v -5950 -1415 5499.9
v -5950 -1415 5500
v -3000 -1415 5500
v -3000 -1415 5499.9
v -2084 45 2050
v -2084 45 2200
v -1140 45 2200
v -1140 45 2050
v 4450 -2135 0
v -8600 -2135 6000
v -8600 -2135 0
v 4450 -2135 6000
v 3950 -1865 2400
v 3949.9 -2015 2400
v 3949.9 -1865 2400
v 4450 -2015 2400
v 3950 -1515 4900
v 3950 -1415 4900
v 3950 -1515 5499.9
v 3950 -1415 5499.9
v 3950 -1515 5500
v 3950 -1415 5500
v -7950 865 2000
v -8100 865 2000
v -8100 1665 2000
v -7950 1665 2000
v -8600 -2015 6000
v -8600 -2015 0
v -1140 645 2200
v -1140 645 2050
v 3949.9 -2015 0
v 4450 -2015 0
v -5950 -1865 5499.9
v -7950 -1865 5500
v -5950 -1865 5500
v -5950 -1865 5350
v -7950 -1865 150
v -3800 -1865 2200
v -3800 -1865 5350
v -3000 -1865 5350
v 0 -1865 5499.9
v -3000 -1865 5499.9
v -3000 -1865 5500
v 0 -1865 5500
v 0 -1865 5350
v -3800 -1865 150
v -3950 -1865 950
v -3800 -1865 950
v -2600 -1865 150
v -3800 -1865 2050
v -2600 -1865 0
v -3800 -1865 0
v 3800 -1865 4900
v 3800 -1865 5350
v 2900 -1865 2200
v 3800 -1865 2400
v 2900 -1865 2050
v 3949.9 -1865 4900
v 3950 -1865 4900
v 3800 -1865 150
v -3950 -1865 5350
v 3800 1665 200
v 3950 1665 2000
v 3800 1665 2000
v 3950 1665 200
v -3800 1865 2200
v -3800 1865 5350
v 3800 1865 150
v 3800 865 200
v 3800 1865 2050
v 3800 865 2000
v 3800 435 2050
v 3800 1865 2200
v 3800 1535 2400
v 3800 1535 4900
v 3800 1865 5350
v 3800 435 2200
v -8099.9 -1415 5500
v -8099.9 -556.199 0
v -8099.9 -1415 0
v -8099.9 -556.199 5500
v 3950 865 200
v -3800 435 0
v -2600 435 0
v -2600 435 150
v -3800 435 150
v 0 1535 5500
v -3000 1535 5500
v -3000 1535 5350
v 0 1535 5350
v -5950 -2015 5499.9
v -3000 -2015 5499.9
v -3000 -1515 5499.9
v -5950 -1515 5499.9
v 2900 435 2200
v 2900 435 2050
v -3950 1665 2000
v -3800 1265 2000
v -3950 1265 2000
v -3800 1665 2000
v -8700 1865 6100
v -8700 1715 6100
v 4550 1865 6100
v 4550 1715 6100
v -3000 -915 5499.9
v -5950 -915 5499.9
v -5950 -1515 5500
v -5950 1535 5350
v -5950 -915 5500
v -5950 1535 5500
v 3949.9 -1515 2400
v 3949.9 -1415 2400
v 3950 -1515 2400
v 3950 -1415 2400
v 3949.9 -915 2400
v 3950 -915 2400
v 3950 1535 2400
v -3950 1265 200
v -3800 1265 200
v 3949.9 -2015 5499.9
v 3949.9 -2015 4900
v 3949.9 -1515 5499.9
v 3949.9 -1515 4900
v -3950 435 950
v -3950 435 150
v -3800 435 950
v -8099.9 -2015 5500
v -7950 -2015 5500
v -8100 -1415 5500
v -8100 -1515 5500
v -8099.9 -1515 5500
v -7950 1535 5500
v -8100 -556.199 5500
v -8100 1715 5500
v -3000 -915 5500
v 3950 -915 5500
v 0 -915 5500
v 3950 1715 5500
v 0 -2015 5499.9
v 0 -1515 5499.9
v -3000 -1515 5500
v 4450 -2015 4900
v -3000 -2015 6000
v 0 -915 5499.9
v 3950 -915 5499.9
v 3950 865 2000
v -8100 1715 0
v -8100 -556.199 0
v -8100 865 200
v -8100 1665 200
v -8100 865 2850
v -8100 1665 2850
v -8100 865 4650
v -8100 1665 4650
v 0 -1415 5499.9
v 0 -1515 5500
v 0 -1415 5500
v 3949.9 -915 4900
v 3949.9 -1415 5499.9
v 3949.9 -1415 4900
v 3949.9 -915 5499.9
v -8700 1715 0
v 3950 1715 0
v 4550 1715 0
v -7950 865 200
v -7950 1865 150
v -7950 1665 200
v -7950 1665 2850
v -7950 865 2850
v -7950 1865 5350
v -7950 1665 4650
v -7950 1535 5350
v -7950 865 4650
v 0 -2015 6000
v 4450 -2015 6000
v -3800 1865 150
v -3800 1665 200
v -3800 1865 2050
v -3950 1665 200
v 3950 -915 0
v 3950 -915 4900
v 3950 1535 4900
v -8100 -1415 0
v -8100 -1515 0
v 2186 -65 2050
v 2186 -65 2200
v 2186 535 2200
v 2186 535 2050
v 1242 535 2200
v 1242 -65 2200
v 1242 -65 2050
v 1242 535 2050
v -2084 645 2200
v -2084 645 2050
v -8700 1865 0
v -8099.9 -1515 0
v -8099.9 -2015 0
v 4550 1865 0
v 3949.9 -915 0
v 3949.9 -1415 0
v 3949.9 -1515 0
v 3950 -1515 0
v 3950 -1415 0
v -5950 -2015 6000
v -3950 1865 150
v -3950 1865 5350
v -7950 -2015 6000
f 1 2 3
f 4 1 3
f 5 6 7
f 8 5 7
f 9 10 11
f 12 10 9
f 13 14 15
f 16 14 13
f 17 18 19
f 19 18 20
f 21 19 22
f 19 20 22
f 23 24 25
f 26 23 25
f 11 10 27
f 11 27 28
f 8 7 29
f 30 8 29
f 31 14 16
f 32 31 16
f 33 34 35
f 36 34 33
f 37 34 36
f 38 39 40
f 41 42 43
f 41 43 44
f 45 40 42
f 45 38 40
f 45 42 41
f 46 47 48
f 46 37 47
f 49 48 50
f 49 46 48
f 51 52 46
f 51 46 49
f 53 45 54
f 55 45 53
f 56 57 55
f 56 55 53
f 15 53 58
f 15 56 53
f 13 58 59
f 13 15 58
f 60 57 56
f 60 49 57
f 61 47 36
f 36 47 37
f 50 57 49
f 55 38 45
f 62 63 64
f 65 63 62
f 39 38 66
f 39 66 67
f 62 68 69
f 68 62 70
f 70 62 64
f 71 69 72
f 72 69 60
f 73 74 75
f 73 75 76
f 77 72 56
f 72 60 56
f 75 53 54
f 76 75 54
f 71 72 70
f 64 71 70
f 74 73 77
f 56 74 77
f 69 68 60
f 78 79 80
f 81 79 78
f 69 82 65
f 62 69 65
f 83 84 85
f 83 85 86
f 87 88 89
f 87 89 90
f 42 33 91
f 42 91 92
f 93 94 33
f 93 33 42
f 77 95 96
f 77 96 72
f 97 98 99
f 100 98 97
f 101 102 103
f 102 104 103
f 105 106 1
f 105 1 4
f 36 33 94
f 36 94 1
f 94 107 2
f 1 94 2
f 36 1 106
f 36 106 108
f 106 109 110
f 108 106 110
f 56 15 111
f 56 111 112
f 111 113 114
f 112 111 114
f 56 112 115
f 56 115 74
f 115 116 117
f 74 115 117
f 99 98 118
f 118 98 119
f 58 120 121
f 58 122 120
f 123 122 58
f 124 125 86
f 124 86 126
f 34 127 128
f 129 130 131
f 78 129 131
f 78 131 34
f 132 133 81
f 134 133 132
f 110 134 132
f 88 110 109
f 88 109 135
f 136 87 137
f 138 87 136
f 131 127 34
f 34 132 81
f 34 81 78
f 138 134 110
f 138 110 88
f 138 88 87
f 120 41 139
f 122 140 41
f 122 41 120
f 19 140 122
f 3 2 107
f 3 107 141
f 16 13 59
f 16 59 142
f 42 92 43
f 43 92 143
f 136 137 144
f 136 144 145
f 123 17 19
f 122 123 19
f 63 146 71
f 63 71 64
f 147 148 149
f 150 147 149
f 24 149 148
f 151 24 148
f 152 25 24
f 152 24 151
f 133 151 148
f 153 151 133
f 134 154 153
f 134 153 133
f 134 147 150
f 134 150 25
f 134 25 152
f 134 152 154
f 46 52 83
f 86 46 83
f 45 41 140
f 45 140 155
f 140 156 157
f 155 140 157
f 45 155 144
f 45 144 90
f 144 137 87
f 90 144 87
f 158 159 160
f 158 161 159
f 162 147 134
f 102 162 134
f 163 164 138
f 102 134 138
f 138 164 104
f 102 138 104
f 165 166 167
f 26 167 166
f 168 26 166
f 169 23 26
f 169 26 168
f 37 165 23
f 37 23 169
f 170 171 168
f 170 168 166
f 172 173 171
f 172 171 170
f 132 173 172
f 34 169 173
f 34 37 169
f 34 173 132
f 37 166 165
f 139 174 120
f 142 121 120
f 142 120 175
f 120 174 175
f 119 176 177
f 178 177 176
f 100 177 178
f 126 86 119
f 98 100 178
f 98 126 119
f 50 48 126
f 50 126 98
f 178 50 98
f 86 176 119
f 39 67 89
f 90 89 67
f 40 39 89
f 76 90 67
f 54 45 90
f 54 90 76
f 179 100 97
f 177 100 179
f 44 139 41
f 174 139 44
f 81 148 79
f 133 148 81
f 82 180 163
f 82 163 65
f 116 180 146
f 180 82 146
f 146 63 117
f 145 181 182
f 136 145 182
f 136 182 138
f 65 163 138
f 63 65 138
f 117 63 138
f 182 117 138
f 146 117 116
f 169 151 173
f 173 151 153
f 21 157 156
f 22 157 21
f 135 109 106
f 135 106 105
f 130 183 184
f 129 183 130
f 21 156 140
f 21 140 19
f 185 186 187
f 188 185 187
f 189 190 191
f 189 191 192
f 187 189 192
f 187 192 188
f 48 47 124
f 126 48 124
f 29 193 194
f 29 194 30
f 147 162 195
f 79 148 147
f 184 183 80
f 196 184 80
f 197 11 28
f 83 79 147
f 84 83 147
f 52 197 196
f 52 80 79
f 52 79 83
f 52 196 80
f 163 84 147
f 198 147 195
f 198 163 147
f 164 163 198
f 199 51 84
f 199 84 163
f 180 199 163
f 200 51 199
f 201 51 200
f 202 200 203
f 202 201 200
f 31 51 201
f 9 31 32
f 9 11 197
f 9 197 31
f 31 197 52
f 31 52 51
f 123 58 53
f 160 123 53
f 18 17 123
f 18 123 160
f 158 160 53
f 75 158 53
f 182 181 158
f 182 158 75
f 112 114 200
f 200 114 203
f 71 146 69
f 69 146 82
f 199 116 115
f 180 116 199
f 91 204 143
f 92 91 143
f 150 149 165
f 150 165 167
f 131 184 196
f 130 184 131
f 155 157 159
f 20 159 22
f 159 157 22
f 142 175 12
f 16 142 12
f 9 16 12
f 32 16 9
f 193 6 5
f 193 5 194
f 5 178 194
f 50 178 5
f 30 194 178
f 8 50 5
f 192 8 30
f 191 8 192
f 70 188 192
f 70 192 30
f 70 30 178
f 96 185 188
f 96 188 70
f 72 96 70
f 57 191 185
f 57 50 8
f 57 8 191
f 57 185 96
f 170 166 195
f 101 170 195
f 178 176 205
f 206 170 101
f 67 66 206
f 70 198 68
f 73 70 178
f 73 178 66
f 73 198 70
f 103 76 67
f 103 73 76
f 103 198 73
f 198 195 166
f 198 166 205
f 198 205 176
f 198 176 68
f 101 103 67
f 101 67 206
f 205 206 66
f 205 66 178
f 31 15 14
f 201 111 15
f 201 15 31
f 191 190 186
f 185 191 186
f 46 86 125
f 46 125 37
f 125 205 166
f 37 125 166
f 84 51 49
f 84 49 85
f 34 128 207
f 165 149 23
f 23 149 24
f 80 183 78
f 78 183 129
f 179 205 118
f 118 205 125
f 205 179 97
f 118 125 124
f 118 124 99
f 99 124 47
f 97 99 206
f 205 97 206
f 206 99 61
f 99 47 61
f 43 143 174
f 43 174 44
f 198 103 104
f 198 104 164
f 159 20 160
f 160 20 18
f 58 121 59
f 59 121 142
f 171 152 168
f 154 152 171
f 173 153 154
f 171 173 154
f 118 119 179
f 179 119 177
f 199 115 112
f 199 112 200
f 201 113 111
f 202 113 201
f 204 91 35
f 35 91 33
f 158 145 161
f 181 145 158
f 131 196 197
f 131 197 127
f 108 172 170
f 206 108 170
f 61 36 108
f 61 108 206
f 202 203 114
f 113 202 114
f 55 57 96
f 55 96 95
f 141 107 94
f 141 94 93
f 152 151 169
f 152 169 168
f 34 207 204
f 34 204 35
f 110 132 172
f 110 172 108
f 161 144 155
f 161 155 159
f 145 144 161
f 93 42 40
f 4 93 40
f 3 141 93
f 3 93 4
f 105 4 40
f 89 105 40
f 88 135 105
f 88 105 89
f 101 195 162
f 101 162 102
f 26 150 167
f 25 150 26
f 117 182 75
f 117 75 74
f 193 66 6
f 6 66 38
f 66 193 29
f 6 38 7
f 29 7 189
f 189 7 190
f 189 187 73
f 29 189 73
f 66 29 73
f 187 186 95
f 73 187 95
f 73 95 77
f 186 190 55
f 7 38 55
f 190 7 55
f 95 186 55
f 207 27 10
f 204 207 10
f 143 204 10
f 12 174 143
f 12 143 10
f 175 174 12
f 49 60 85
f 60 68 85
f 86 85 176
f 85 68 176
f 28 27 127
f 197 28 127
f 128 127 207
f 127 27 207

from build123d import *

# Parameters (mm, degrees)
CROQUIS1_W               = 7900
CROQUIS1_H               = 3730
SALIENTE_EXTRUIR1_DEPTH  = 5500
CROQUIS2_W               = 7600
CROQUIS2_H               = 5200
CORTAR_EXTRUIR1_DEPTH    = 3250
CROQUIS3_W               = 7600
CROQUIS3_H               = 150
SALIENTE_EXTRUIR2_DEPTH  = 3250
CROQUIS4_W               = 800
CROQUIS4_H               = 2300
CORTAR_EXTRUIR2_DEPTH    = 150
CROQUIS7_W               = 5500
CROQUIS7_H               = 3730
SALIENTE_EXTRUIR4_DEPTH  = 4150
CROQUIS8_W               = 4000
CROQUIS8_H               = 5200
CORTAR_EXTRUIR3_DEPTH    = 3250
CROQUIS10_W              = 900
CROQUIS10_H              = 150
CORTAR_EXTRUIR5_DEPTH    = 2300
CROQUIS11_W              = 2500
CROQUIS11_H              = 3400
CORTAR_EXTRUIR6_DEPTH    = 150
CROQUIS12_W              = 1800
CROQUIS12_H              = 800
CORTAR_EXTRUIR7_DEPTH    = 150
CROQUIS13_W              = 3000
CROQUIS13_H              = 3400
CORTAR_EXTRUIR8_DEPTH    = 150
CROQUIS15_W              = 1800
CROQUIS15_H              = 800
CORTAR_EXTRUIR10_DEPTH   = 150
CROQUIS16_W              = 2000
CROQUIS16_H              = 2300
CORTAR_EXTRUIR11_DEPTH   = 150
CROQUIS17_W              = 12050
CROQUIS17_H              = 150
SALIENTE_EXTRUIR5_DEPTH  = 600
CROQUIS18_W              = 6100
CROQUIS18_H              = 150
SALIENTE_EXTRUIR6_DEPTH  = 600
CROQUIS19_W              = 6100
CROQUIS19_H              = 150
SALIENTE_EXTRUIR7_DEPTH  = 600
CROQUIS20_W              = 7600
CROQUIS20_H              = 1900
CROQUIS20_H_2            = 3150
CROQUIS20_W_2            = 4000
CROQUIS20_H_3            = 5200
CORTAR_EXTRUIR12_DEPTH   = 1280
CROQUIS21_W              = 2000
CROQUIS21_H              = 3400
CORTAR_EXTRUIR13_DEPTH   = 150
CROQUIS24_W              = 2000
CROQUIS24_H              = 2300
SALIENTE_EXTRUIR11_DEPTH = 150
CROQUIS25_W              = 1800
CROQUIS25_H              = 400
CORTAR_EXTRUIR14_DEPTH   = 170
CROQUIS26_W              = 12050
CROQUIS26_H              = 5500
SALIENTE_EXTRUIR12_DEPTH = 270
SALIENTE_EXTRUIR13_DEPTH = 120
CROQUIS33_W              = 2500
CROQUIS33_H              = 150
SALIENTE_EXTRUIR19_DEPTH = 500
CROQUIS34_W              = 2000
CROQUIS34_H              = 150
CROQUIS34_W_2            = 3000
SALIENTE_EXTRUIR20_DEPTH = 500
CORTAR_EXTRUIR15_DEPTH   = 7950
CORTAR_EXTRUIR16_DEPTH   = 2500
CROQUIS37_W              = 5500
CROQUIS37_H              = 500
CORTAR_EXTRUIR17_DEPTH   = 0.1
CROQUIS38_W              = 2950
CROQUIS38_H              = 500
CROQUIS38_W_2            = 3950
CORTAR_EXTRUIR18_DEPTH   = 0.1
CROQUIS40_W              = 2400
CROQUIS40_H              = 500
CORTAR_EXTRUIR21_DEPTH   = 0.1
CROQUIS42_W              = 5500
CROQUIS42_H              = 858.801282929
CORTAR_EXTRUIR24_DEPTH   = 0.1
CROQUIS43_W              = 2950
CROQUIS43_H              = 500
CROQUIS43_W_2            = 3950
CORTAR_EXTRUIR25_DEPTH   = 0.1
CROQUIS44_W              = 599.9
CROQUIS44_H              = 500
CROQUIS44_W_2            = 2400
CROQUIS44_H_2            = 499.99998
CORTAR_EXTRUIR26_DEPTH   = 0.1
CROQUIS47_W              = 1200
CROQUIS47_H              = 2300
CORTAR_EXTRUIR28_DEPTH   = 150
CROQUIS48_W              = 1800
CROQUIS48_H              = 800
CORTAR_EXTRUIR29_DEPTH   = 150
CROQUIS50_W              = 944
CROQUIS50_H              = 600
CORTAR_EXTRUIR30_DEPTH   = 150


with BuildPart() as part:
    # Croquis1 → Saliente-Extruir1 (new body)
    with BuildSketch(Plane.XY):
        Rectangle(CROQUIS1_W, CROQUIS1_H)
    extrude(amount=SALIENTE_EXTRUIR1_DEPTH)

    # Croquis2 → Cortar-Extruir1 (cut)
    with BuildSketch(Plane.XZ.offset(1865)):
        with Locations((0, 2750)):
            Rectangle(CROQUIS2_W, CROQUIS2_H)
    extrude(amount=-CORTAR_EXTRUIR1_DEPTH, mode=Mode.SUBTRACT)

    # Croquis3 → Saliente-Extruir2 (add)
    with BuildSketch(Plane.XZ.offset(1865)):
        with Locations((0, 2125)):
            Rectangle(CROQUIS3_W, CROQUIS3_H)
    extrude(amount=-SALIENTE_EXTRUIR2_DEPTH)

    # Croquis4 → Cortar-Extruir2 (cut)
    with BuildSketch(Plane.ZY.offset(3950)):
        with Locations((550, -715)):
            Rectangle(CROQUIS4_W, CROQUIS4_H)
    extrude(amount=-CORTAR_EXTRUIR2_DEPTH, mode=Mode.SUBTRACT)

    # Croquis7 → Saliente-Extruir4 (add)
    with BuildSketch(Plane.ZY.offset(3950)):
        with Locations((2750, 0)):
            Rectangle(CROQUIS7_W, CROQUIS7_H)
    extrude(amount=SALIENTE_EXTRUIR4_DEPTH)

    # Croquis8 → Cortar-Extruir3 (cut)
    with BuildSketch(Plane.XZ.offset(1865)):
        with Locations((-5950, 2750)):
            Rectangle(CROQUIS8_W, CROQUIS8_H)
    extrude(amount=-CORTAR_EXTRUIR3_DEPTH, mode=Mode.SUBTRACT)

    # Croquis10 → Cortar-Extruir5 (cut)
    with BuildSketch(Plane.XZ.offset(1865)):
        with Locations((3350, 2125)):
            Rectangle(CROQUIS10_W, CROQUIS10_H)
    extrude(amount=-CORTAR_EXTRUIR5_DEPTH, mode=Mode.SUBTRACT)

    # Croquis11 → Cortar-Extruir6 (cut)
    with BuildSketch(Plane(origin=(3950, 0, 0), x_dir=(0, 0, -1), z_dir=(1, 0, 0))):
        with Locations((-3650, -165)):
            Rectangle(CROQUIS11_W, CROQUIS11_H)
    extrude(amount=-CORTAR_EXTRUIR6_DEPTH, mode=Mode.SUBTRACT)

    # Croquis12 → Cortar-Extruir7 (cut)
    with BuildSketch(Plane(origin=(3950, 0, 0), x_dir=(0, 0, -1), z_dir=(1, 0, 0))):
        with Locations((-1100, 1265)):
            Rectangle(CROQUIS12_W, CROQUIS12_H)
    extrude(amount=-CORTAR_EXTRUIR7_DEPTH, mode=Mode.SUBTRACT)

    # Croquis13 → Cortar-Extruir8 (cut)
    with BuildSketch(Plane.XY.offset(5500)):
        with Locations((-1500, -165)):
            Rectangle(CROQUIS13_W, CROQUIS13_H)
    extrude(amount=-CORTAR_EXTRUIR8_DEPTH, mode=Mode.SUBTRACT)

    # Croquis15 → Cortar-Extruir10 (cut)
    with BuildSketch(Plane.ZY.offset(8100)):
        with Locations((1100, 1265)):
            Rectangle(CROQUIS15_W, CROQUIS15_H)
    extrude(amount=-CORTAR_EXTRUIR10_DEPTH, mode=Mode.SUBTRACT)

    # Croquis16 → Cortar-Extruir11 (cut)
    with BuildSketch(Plane(origin=(0, 0, 0), x_dir=(-1, 0, 0), z_dir=(0, 0, -1))):
        with Locations((5950, -715)):
            Rectangle(CROQUIS16_W, CROQUIS16_H)
    extrude(amount=-CORTAR_EXTRUIR11_DEPTH, mode=Mode.SUBTRACT)

    # Croquis17 → Saliente-Extruir5 (add)
    with BuildSketch(Plane.XY.offset(5500)):
        with Locations((-2075, 1790)):
            Rectangle(CROQUIS17_W, CROQUIS17_H)
    extrude(amount=SALIENTE_EXTRUIR5_DEPTH)

    # Croquis18 → Saliente-Extruir6 (add)
    with BuildSketch(Plane(origin=(3950, 0, 0), x_dir=(0, 0, -1), z_dir=(1, 0, 0))):
        with Locations((-3050, 1790)):
            Rectangle(CROQUIS18_W, CROQUIS18_H)
    extrude(amount=SALIENTE_EXTRUIR6_DEPTH)

    # Croquis19 → Saliente-Extruir7 (add)
    with BuildSketch(Plane.ZY.offset(8100)):
        with Locations((3050, 1790)):
            Rectangle(CROQUIS19_W, CROQUIS19_H)
    extrude(amount=SALIENTE_EXTRUIR7_DEPTH)

    # Croquis20 → Cortar-Extruir12 (cut)
    with BuildSketch(Plane.XZ.offset(-1385)):
        with Locations((0, 1100)):
            Rectangle(CROQUIS20_W, CROQUIS20_H)
        with Locations((0, 3775)):
            Rectangle(CROQUIS20_W, CROQUIS20_H_2)
        with Locations((-5950, 2750)):
            Rectangle(CROQUIS20_W_2, CROQUIS20_H_3)
    extrude(amount=-CORTAR_EXTRUIR12_DEPTH, mode=Mode.SUBTRACT)

    # Croquis21 → Cortar-Extruir13 (cut)
    with BuildSketch(Plane.XY.offset(5500)):
        with Locations((-6950, -165)):
            Rectangle(CROQUIS21_W, CROQUIS21_H)
    extrude(amount=-CORTAR_EXTRUIR13_DEPTH, mode=Mode.SUBTRACT)

    # Croquis24 → Saliente-Extruir11 (add)
    with BuildSketch(Plane(origin=(0, 0, 0), x_dir=(-1, 0, 0), z_dir=(0, 0, -1))):
        with Locations((5950, -715)):
            Rectangle(CROQUIS24_W, CROQUIS24_H)
    extrude(amount=-SALIENTE_EXTRUIR11_DEPTH)

    # Croquis25 → Cortar-Extruir14 (cut)
    with BuildSketch(Plane(origin=(-3800, 0, 0), x_dir=(0, 0, -1), z_dir=(1, 0, 0))):
        with Locations((-1100, 1465)):
            Rectangle(CROQUIS25_W, CROQUIS25_H)
    extrude(amount=-CORTAR_EXTRUIR14_DEPTH, mode=Mode.SUBTRACT)

    # Croquis26 → Saliente-Extruir12 (add)
    with BuildSketch(Plane.XZ.offset(1865)):
        with Locations((-2075, 2750)):
            Rectangle(CROQUIS26_W, CROQUIS26_H)
    extrude(amount=SALIENTE_EXTRUIR12_DEPTH)



with BuildPart() as body_2:
    # Croquis27 → Saliente-Extruir13 (new body)
    with BuildSketch(Plane.XZ.offset(2135)):
        Polygon((-8100, 0), (-8100, 5500), (3950, 5500), (3950, 0), (4450, 0), (4450, 6000), (-8600, 6000), (-8600, 0), align=None)
    extrude(amount=-SALIENTE_EXTRUIR13_DEPTH)


with BuildPart() as part_1:
    add(part.part)

    add(body_2.part)  # Saliente-Extruir19 merges body 2
    # Croquis33 → Saliente-Extruir19 (add)
    with BuildSketch(Plane(origin=(3950, 0, 0), x_dir=(0, 0, -1), z_dir=(1, 0, 0))):
        with Locations((-3650, -1940)):
            Rectangle(CROQUIS33_W, CROQUIS33_H)
    extrude(amount=SALIENTE_EXTRUIR19_DEPTH)

    # Croquis34 → Saliente-Extruir20 (add)
    with BuildSketch(Plane.XY.offset(5500)):
        with Locations((-6950, -1940)):
            Rectangle(CROQUIS34_W, CROQUIS34_H)
        with Locations((-1500, -1940)):
            Rectangle(CROQUIS34_W_2, CROQUIS34_H)
    extrude(amount=SALIENTE_EXTRUIR20_DEPTH)

    # Croquis35 → Cortar-Extruir15 (cut)
    with BuildSketch(Plane.ZY.offset(7950)):
        Polygon((6000, -2015), (5500, -1865), (6000, -1865), align=None)
    extrude(amount=-CORTAR_EXTRUIR15_DEPTH, mode=Mode.SUBTRACT)

    # Croquis36 → Cortar-Extruir16 (cut)
    with BuildSketch(Plane(origin=(0, 0, 2400), x_dir=(-1, 0, 0), z_dir=(0, 0, -1))):
        Polygon((-4450, -1865), (-3950, -1865), (-4450, -2015), align=None)
    extrude(amount=-CORTAR_EXTRUIR16_DEPTH, mode=Mode.SUBTRACT)

    # Croquis37 → Cortar-Extruir17 (cut)
    with BuildSketch(Plane.ZY.offset(8100)):
        with Locations((2750, -1765)):
            Rectangle(CROQUIS37_W, CROQUIS37_H)
    extrude(amount=-CORTAR_EXTRUIR17_DEPTH, mode=Mode.SUBTRACT)

    # Croquis38 → Cortar-Extruir18 (cut)
    with BuildSketch(Plane.XY.offset(5500)):
        with Locations((-4475, -1765)):
            Rectangle(CROQUIS38_W, CROQUIS38_H)
        with Locations((1975, -1765)):
            Rectangle(CROQUIS38_W_2, CROQUIS38_H)
    extrude(amount=-CORTAR_EXTRUIR18_DEPTH, mode=Mode.SUBTRACT)

    # Croquis40 → Cortar-Extruir21 (cut)
    with BuildSketch(Plane(origin=(3950, 0, 0), x_dir=(0, 0, -1), z_dir=(1, 0, 0))):
        with Locations((-1200, -1765)):
            Rectangle(CROQUIS40_W, CROQUIS40_H)
        Polygon((-4900, -2015), (-4900, -1515.00001), (-5500, -1515.00001), (-5499.9, -2015), align=None)
    extrude(amount=-CORTAR_EXTRUIR21_DEPTH, mode=Mode.SUBTRACT)

    # Croquis42 → Cortar-Extruir24 (cut)
    with BuildSketch(Plane.ZY.offset(8100)):
        with Locations((2750, -985.599358535)):
            Rectangle(CROQUIS42_W, CROQUIS42_H)
    extrude(amount=-CORTAR_EXTRUIR24_DEPTH, mode=Mode.SUBTRACT)

    # Croquis43 → Cortar-Extruir25 (cut)
    with BuildSketch(Plane.XY.offset(5500)):
        with Locations((-4475, -1165)):
            Rectangle(CROQUIS43_W, CROQUIS43_H)
        with Locations((1975, -1165)):
            Rectangle(CROQUIS43_W_2, CROQUIS43_H)
    extrude(amount=-CORTAR_EXTRUIR25_DEPTH, mode=Mode.SUBTRACT)

    # Croquis44 → Cortar-Extruir26 (cut)
    with BuildSketch(Plane(origin=(3950, 0, 0), x_dir=(0, 0, -1), z_dir=(1, 0, 0))):
        with Locations((-5199.95, -1165.00001)):
            Rectangle(CROQUIS44_W, CROQUIS44_H)
        with Locations((-1200, -1165.00001)):
            Rectangle(CROQUIS44_W_2, CROQUIS44_H_2)
    extrude(amount=-CORTAR_EXTRUIR26_DEPTH, mode=Mode.SUBTRACT)

    # Croquis47 → Cortar-Extruir28 (cut)
    with BuildSketch(Plane(origin=(0, 0, 0), x_dir=(-1, 0, 0), z_dir=(0, 0, -1))):
        with Locations((3200, -715)):
            Rectangle(CROQUIS47_W, CROQUIS47_H)
    extrude(amount=-CORTAR_EXTRUIR28_DEPTH, mode=Mode.SUBTRACT)

    # Croquis48 → Cortar-Extruir29 (cut)
    with BuildSketch(Plane.ZY.offset(8100)):
        with Locations((3750, 1265)):
            Rectangle(CROQUIS48_W, CROQUIS48_H)
    extrude(amount=-CORTAR_EXTRUIR29_DEPTH, mode=Mode.SUBTRACT)

    # Croquis50 → Cortar-Extruir30 (cut)
    with BuildSketch(Plane.XY.offset(2200)):
        with Locations((-1612, 345)):
            Rectangle(CROQUIS50_W, CROQUIS50_H)
        with Locations((1714, 235)):
            Rectangle(CROQUIS50_W, CROQUIS50_H)
    extrude(amount=-CORTAR_EXTRUIR30_DEPTH, mode=Mode.SUBTRACT)


solid = part_1.part
